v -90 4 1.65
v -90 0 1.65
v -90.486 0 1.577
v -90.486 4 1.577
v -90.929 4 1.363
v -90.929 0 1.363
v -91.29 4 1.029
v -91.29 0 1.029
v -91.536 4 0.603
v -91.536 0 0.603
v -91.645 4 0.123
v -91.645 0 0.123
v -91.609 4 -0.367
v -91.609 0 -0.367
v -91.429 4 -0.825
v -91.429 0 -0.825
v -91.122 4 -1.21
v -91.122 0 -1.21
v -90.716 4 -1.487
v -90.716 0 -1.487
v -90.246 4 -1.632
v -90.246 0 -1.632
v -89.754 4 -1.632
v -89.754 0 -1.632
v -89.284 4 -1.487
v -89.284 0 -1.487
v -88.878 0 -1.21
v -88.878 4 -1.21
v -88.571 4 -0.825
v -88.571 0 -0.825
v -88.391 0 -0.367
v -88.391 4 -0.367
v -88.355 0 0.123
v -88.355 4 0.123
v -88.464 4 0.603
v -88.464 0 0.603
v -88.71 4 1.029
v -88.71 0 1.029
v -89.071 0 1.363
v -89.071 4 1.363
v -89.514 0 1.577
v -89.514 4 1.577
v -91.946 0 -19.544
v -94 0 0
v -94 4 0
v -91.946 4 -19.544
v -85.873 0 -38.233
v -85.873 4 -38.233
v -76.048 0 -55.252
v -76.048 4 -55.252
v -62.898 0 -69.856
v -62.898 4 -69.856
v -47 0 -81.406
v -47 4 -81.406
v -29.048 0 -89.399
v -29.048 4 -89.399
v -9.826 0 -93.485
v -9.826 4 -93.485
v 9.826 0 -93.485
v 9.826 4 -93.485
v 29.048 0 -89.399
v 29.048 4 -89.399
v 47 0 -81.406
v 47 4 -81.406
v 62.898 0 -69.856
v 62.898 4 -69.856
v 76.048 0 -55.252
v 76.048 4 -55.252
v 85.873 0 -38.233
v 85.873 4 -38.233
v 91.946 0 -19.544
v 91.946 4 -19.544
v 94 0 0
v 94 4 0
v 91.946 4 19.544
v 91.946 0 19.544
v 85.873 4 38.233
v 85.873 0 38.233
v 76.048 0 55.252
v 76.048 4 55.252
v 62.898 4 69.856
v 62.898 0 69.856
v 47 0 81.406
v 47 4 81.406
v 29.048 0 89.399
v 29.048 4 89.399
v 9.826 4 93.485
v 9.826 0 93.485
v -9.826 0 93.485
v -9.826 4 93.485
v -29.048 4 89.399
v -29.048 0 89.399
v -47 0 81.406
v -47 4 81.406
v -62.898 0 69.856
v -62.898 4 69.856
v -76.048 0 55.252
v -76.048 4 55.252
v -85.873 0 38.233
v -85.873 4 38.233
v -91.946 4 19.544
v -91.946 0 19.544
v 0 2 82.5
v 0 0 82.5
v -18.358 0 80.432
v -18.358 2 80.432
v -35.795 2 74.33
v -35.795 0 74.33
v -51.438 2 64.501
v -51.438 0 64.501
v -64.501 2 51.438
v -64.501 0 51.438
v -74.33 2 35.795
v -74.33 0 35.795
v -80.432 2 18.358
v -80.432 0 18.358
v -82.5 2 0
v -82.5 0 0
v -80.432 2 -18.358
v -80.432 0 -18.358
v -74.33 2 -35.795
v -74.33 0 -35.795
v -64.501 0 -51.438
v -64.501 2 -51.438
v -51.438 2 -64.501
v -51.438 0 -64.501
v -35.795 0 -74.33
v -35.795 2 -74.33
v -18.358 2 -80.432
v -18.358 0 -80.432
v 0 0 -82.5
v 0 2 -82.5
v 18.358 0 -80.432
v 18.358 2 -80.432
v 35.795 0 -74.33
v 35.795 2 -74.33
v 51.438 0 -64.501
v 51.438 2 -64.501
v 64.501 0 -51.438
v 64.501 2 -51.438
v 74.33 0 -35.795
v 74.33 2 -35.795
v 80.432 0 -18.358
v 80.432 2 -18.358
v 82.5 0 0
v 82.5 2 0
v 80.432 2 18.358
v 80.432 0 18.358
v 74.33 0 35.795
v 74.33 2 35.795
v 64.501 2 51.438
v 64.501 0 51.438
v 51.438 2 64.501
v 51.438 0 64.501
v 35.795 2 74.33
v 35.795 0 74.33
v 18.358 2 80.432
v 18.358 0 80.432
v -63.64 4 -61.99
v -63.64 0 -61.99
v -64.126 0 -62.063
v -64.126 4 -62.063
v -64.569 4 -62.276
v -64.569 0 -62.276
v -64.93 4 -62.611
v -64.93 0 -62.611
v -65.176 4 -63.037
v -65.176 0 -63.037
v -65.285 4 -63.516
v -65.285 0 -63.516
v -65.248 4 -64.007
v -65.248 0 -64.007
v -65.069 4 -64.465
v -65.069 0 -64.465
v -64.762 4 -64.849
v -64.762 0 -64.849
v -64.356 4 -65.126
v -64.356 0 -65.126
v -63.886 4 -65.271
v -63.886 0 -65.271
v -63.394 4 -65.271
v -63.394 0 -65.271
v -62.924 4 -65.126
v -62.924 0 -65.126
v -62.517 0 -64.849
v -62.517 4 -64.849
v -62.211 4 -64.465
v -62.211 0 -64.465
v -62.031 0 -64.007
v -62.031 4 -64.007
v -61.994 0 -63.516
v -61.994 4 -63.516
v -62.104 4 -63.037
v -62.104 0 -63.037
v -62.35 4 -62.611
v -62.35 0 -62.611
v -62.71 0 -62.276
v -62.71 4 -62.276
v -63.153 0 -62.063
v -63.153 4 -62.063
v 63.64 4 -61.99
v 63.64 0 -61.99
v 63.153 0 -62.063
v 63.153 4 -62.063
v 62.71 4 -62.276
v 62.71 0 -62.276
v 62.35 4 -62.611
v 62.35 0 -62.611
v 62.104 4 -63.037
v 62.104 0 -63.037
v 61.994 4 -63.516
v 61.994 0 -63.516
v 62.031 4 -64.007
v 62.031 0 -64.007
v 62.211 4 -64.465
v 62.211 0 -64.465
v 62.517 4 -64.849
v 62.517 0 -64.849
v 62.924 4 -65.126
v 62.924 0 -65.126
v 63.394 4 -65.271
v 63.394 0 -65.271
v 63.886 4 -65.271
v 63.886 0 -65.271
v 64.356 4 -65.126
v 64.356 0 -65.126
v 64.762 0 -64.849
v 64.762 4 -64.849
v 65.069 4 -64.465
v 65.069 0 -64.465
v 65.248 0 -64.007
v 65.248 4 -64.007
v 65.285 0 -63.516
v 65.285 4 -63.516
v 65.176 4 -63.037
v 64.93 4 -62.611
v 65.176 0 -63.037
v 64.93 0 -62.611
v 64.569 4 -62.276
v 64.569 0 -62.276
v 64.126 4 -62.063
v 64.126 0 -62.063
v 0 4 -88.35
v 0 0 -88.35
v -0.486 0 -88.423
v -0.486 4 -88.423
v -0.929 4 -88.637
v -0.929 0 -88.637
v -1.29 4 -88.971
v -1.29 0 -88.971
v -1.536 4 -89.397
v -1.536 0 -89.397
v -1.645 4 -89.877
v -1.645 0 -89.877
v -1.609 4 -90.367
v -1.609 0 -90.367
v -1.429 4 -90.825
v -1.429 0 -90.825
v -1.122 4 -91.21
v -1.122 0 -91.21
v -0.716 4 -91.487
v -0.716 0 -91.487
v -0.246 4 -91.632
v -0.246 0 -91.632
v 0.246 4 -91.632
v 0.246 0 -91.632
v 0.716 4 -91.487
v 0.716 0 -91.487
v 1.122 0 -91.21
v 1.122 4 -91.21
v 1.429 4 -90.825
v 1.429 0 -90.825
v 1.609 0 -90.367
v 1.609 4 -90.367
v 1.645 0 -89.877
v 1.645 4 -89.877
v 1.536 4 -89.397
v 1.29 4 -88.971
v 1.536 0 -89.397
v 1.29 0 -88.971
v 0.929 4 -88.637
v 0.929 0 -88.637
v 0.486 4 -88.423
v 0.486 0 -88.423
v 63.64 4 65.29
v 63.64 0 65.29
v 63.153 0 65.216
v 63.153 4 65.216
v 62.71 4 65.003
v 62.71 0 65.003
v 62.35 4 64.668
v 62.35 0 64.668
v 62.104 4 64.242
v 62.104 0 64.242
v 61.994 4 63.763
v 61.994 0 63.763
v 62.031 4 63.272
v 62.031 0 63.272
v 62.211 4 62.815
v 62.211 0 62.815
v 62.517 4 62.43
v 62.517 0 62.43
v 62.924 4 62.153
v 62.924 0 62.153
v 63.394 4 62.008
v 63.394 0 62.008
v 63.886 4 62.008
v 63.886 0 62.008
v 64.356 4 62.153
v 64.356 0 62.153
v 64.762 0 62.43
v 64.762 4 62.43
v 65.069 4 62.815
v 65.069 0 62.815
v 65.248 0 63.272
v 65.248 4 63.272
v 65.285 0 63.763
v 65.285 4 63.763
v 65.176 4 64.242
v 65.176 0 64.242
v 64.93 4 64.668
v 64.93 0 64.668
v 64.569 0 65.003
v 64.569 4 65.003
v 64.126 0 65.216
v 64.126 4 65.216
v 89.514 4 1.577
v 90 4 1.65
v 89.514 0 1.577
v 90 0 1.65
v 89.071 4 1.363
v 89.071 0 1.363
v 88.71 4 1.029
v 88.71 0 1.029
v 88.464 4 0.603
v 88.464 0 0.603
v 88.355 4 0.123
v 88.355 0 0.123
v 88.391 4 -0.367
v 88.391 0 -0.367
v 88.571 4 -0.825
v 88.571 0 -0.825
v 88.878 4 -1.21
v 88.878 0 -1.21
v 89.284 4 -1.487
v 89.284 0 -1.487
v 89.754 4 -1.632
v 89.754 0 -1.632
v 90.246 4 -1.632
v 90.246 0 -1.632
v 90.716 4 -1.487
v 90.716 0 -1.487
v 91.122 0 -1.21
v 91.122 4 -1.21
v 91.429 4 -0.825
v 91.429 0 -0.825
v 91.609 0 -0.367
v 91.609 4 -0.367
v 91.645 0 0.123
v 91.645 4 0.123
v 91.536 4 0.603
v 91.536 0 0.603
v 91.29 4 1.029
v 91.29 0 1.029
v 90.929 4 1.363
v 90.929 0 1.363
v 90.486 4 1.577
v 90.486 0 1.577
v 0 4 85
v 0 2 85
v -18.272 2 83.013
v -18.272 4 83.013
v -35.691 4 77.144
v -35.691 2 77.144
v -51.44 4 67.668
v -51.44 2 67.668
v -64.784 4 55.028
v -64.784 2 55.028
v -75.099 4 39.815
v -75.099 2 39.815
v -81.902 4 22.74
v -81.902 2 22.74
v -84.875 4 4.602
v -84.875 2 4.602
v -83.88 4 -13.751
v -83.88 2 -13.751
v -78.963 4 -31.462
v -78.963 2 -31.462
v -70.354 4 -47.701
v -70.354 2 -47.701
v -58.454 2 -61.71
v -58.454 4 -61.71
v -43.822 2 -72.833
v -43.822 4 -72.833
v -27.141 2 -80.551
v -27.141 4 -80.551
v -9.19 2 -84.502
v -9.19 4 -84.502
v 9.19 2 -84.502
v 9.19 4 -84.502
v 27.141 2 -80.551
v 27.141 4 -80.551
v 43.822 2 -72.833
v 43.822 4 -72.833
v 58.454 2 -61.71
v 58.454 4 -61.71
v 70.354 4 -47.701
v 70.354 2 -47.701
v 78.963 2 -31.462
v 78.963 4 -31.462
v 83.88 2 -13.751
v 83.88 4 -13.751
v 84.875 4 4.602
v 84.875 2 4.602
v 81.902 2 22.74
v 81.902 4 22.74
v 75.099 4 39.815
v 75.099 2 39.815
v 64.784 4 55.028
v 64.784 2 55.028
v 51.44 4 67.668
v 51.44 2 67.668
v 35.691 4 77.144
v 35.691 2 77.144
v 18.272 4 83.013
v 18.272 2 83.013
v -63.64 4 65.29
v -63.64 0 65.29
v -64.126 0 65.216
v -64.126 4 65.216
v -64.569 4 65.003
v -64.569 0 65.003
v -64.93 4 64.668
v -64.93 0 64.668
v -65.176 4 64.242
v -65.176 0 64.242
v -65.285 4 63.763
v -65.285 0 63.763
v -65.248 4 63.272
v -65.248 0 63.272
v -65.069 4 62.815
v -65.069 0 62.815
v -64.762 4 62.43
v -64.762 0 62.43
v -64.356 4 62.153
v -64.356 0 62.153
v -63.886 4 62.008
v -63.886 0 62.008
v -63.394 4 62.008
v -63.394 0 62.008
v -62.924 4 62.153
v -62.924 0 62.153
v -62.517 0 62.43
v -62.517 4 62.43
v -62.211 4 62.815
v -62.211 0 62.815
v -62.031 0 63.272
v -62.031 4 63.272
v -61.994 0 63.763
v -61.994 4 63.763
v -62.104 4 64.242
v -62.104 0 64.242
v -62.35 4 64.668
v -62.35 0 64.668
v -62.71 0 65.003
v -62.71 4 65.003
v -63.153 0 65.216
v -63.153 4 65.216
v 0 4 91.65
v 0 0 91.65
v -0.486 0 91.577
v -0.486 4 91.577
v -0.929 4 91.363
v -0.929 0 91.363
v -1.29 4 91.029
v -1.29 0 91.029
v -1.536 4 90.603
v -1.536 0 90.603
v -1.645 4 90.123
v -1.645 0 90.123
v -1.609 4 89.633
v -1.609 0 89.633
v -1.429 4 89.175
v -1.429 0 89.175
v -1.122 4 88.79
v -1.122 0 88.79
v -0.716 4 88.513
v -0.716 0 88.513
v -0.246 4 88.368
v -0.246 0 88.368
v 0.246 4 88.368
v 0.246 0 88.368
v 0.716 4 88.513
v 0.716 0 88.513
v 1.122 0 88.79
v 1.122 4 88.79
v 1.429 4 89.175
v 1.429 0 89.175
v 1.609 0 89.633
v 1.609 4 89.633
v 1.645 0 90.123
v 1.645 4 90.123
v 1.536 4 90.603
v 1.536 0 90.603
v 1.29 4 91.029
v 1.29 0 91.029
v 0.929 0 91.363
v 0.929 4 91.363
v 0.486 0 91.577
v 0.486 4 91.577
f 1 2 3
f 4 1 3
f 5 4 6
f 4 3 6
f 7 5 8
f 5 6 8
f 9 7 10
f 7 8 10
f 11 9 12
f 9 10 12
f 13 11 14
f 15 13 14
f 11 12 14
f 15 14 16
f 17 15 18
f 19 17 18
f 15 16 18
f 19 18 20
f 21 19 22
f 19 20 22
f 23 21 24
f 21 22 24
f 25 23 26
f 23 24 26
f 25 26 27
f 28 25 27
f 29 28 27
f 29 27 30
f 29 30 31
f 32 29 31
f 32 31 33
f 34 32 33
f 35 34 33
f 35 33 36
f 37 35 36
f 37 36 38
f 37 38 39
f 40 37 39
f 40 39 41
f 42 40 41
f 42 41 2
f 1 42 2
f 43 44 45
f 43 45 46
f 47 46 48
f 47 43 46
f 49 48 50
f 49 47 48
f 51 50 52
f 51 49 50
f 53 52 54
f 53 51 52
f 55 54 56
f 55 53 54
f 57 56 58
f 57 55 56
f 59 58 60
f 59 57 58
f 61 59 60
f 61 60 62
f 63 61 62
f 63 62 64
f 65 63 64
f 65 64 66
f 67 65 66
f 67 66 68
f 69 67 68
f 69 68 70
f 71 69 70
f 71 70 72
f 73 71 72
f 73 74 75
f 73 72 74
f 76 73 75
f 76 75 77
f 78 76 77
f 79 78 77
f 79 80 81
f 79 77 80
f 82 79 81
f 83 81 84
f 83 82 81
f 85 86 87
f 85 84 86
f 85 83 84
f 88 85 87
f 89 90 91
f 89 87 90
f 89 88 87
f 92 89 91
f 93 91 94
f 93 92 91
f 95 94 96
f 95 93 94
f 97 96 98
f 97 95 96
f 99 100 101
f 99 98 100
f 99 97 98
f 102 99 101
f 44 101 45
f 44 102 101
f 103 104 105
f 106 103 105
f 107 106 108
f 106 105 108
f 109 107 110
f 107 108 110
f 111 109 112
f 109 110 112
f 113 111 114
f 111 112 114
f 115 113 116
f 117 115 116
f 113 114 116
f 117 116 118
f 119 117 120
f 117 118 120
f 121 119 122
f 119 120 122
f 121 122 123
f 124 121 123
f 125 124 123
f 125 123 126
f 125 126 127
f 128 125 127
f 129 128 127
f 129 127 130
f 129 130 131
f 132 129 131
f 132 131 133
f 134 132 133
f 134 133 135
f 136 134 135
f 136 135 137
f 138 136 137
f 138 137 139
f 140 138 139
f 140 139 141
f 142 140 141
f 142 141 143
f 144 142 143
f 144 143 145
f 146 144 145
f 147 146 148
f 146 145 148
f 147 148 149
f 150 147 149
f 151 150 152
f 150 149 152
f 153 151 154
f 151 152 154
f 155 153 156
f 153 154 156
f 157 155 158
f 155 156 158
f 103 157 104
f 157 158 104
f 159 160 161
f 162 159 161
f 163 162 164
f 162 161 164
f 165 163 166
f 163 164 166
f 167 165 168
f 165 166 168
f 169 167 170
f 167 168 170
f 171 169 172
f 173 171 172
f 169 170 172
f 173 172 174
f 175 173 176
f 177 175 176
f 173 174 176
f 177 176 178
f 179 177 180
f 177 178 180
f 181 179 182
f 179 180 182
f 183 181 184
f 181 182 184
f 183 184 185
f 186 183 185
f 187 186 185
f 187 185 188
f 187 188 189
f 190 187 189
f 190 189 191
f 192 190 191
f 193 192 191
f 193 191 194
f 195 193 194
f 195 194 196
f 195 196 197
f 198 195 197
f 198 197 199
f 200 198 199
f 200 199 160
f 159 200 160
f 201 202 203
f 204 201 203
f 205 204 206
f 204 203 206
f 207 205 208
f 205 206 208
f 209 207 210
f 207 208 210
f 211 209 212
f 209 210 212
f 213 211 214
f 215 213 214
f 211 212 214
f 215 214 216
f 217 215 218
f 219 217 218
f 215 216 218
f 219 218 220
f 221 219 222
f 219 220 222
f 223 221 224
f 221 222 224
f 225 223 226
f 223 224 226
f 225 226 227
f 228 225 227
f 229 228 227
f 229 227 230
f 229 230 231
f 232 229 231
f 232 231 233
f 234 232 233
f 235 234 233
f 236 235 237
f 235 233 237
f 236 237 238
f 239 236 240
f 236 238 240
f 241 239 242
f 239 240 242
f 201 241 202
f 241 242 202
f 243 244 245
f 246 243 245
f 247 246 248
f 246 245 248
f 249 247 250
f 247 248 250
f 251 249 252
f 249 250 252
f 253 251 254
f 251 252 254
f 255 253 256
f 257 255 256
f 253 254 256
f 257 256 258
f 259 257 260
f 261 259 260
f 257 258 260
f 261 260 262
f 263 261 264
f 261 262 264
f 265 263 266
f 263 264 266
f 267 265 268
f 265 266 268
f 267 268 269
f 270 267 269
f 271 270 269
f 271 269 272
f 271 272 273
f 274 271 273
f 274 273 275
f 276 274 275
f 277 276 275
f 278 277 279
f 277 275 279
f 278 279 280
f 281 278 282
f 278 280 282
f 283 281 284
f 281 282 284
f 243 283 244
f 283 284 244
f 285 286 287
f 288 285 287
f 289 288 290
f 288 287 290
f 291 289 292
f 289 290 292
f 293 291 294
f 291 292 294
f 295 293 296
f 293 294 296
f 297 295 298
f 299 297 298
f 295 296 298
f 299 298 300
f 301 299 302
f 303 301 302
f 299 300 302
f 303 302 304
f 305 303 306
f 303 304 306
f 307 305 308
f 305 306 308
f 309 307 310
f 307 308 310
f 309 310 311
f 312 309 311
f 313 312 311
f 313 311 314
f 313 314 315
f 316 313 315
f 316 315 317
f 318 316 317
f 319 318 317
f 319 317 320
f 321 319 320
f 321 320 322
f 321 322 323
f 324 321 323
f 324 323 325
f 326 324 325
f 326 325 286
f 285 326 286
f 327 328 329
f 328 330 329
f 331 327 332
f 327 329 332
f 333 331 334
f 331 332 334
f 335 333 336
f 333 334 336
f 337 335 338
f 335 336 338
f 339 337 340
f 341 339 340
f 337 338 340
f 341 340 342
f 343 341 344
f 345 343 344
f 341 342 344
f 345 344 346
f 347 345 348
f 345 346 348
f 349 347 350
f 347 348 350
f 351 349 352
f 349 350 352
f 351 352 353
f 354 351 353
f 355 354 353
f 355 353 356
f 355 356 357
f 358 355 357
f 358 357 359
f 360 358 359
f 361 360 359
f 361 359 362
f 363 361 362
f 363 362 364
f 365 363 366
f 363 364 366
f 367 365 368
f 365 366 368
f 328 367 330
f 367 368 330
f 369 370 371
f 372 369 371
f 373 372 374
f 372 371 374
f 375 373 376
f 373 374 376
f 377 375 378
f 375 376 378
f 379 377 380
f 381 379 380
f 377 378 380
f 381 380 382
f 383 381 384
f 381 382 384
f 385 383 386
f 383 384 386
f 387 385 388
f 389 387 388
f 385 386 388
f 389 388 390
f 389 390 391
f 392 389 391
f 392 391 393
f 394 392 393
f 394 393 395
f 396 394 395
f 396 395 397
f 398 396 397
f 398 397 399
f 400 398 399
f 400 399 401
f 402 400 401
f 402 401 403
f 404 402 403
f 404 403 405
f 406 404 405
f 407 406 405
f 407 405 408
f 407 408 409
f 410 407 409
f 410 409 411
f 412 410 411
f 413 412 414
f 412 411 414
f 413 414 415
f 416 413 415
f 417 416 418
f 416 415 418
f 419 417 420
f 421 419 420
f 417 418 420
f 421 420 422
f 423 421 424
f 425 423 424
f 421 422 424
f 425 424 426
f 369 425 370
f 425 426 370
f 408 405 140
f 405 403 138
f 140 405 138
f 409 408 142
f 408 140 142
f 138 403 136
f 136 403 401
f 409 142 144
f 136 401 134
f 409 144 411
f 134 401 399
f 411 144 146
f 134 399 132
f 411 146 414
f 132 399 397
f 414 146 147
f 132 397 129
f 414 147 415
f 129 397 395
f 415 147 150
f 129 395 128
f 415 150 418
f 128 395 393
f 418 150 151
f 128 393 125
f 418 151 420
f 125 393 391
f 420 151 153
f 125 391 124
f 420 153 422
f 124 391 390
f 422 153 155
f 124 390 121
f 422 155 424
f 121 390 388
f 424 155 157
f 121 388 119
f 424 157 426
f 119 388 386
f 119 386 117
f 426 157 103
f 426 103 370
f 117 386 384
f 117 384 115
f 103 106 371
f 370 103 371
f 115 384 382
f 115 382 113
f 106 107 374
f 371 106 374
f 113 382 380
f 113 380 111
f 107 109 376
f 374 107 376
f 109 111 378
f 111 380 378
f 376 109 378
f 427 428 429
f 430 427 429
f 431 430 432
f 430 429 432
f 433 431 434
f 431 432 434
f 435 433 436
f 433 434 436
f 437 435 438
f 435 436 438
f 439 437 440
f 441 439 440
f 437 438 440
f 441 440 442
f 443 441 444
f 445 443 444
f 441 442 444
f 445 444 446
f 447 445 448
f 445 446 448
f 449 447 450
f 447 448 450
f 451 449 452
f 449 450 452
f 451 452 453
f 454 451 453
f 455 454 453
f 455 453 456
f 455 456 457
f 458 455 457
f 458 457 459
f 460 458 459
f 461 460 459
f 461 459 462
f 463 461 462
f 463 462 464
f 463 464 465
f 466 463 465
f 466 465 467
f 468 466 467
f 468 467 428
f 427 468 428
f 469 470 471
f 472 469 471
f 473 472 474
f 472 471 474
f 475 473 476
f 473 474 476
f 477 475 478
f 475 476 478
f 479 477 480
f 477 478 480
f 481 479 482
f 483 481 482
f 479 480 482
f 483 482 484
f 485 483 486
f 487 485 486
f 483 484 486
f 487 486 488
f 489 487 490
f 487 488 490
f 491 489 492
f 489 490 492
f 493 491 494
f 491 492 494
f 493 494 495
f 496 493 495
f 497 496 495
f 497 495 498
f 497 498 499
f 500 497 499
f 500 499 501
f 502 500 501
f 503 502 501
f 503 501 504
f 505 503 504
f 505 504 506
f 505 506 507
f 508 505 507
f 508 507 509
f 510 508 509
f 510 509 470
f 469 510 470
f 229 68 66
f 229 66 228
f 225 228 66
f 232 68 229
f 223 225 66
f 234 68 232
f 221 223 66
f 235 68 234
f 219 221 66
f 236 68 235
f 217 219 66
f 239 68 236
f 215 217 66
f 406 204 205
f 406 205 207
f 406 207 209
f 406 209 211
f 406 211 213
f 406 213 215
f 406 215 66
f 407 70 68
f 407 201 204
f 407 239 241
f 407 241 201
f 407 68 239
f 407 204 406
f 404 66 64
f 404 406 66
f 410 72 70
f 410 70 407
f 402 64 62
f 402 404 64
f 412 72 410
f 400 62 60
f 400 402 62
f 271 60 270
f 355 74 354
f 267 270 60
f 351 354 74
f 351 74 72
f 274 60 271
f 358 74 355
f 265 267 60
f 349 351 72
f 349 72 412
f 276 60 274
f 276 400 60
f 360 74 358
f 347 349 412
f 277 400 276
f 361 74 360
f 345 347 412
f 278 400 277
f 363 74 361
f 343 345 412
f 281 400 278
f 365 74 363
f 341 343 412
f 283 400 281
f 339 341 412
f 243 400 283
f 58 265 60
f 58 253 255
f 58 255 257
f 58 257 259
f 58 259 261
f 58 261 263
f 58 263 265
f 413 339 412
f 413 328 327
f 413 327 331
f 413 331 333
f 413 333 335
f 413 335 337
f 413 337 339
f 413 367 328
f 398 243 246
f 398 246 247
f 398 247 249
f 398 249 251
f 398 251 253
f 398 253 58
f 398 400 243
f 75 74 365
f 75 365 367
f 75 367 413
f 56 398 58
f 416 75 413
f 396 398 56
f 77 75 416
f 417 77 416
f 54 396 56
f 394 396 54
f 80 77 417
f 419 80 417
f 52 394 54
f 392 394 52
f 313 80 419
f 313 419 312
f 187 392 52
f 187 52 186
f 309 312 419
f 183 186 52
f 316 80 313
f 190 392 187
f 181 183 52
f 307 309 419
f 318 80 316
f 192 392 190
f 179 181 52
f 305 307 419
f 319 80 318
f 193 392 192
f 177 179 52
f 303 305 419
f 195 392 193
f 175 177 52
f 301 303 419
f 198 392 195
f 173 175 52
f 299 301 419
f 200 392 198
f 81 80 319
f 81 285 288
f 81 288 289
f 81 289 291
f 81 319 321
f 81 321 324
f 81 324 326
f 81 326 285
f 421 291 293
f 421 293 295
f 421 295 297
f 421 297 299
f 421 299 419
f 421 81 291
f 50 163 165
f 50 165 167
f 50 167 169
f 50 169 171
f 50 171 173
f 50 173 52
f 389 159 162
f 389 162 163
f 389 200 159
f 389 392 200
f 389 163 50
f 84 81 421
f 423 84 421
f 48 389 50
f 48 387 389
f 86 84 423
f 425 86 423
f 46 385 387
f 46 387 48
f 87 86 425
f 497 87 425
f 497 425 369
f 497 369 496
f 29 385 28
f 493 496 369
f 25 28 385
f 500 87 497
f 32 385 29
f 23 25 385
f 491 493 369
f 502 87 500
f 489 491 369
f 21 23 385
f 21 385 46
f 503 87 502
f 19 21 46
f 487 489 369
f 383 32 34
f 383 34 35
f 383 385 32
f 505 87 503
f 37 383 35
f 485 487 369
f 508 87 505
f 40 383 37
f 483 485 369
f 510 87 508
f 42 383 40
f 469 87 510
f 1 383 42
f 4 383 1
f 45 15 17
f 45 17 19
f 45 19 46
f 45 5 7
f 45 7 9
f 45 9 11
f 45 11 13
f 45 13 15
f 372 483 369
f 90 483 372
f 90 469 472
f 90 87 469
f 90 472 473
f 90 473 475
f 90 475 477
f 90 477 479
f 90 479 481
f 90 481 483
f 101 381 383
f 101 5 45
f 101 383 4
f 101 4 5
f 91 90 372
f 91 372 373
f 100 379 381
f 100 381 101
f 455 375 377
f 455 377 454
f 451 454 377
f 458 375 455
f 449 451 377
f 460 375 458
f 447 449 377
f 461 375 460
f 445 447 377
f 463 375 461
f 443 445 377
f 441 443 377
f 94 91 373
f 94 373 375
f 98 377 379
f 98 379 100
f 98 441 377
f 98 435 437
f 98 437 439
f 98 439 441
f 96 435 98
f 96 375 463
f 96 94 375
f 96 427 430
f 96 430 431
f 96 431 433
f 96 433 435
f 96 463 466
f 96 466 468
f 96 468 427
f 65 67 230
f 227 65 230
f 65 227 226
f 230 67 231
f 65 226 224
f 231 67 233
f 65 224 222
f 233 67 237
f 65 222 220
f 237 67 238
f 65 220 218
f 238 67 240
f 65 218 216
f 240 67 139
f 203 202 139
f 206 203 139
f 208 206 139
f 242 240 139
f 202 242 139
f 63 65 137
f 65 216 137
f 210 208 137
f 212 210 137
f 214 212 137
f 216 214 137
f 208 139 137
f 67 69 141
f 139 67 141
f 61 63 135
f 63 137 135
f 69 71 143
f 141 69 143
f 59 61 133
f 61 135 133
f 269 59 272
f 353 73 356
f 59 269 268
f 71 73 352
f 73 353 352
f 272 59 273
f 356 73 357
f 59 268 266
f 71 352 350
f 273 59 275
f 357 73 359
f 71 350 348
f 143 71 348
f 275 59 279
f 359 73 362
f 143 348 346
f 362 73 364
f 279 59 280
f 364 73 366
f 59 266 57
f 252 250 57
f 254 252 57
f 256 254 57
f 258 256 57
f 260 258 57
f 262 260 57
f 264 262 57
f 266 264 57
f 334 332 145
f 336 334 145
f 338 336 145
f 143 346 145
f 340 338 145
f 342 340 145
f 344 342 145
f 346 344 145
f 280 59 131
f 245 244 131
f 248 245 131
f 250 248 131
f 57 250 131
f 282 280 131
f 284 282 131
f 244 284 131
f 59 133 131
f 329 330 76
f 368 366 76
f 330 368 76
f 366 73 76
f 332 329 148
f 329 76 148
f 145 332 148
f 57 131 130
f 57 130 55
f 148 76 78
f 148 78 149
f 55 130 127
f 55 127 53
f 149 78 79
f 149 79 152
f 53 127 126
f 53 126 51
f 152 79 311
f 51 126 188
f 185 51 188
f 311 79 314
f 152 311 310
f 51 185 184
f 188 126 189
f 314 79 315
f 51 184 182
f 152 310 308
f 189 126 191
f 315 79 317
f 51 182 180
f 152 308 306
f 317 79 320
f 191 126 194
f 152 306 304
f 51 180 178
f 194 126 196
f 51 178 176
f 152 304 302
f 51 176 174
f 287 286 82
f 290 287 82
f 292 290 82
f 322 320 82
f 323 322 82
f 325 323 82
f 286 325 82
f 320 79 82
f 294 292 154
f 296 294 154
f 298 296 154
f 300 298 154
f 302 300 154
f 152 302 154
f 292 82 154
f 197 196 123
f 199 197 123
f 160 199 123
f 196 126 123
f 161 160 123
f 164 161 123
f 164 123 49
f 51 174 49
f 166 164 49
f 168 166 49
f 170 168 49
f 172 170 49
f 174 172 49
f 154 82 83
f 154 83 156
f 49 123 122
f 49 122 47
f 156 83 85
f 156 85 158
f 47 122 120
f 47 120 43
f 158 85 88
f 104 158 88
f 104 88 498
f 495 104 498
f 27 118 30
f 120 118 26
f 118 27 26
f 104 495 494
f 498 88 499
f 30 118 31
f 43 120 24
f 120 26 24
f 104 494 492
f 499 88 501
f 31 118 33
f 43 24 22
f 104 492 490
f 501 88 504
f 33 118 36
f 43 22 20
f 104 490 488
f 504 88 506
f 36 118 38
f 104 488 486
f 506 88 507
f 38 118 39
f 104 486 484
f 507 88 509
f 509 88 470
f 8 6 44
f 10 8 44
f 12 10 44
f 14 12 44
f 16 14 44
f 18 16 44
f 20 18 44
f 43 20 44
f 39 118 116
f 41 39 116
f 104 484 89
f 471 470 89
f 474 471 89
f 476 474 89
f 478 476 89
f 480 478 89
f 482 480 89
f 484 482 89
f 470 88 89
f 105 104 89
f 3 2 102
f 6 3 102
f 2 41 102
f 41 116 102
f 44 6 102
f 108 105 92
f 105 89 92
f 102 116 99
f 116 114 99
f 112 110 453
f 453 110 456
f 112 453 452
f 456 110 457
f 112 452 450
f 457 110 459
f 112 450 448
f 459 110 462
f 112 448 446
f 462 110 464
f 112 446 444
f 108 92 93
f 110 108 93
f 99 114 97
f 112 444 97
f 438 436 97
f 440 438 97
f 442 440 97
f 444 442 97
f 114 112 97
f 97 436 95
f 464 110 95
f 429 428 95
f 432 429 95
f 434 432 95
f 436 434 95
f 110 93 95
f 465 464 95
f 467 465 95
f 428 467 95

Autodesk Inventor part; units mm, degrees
ref_plane "YZ Plane" through (0, 0, 0) normal (1, 0, 0) x (0, 1, 0)
ref_plane "XZ Plane" through (0, 0, 0) normal (0, 1, 0) x (-1, 0, 0)
ref_plane "XY Plane" through (0, 0, 0) normal (0, 0, 1) x (1, 0, 0)
sketch "Sketch1" plane through (0, 0, 0) normal (0, 1, 0) x (-1, 0, 0)
  circle A0 centre (0, 0) radius 94
  dimension "d0" = 188
extrude "Extrusion1" add sketch "Sketch1" along normal blind 4
sketch "Sketch2" plane through (0, 4, 0) normal (0, 1, 0) x (1, 0, 0)
  circle A0 centre (0, 0) radius 87.5
  dimension "d3" = 175
hole "Hole1" at (0, 4, 0) direction (0, -1, 0) diameter 170 depth 2
sketch "Sketch3" plane through (0, 2, 0) normal (0, 1, 0) x (1, 0, 0)
  circle A0 centre (0, 0) radius 82
  dimension "d11" = 164
hole "Hole2" at (0, 2, 0) direction (0, -1, 0) diameter 165 end through all
sketch "Sketch4" plane through (0, 4, 0) normal (0, 1, 0) x (1, 0, 0)
  circle A0 centre (-90, 0) radius 1.65
  point P0 (0, 0)
  dimension "d19" = 3.3
  dimension "d20" = 90
sketch "Sketch5" plane through (0, 4, 0) normal (0, 1, 0) x (1, 0, 0)
  circle A0 centre (-63.6396, 63.6396) radius 1.65
  point P0 (0, 0)
  dimension "d28" = 3.3
  dimension "d29" = 90
  dimension "d33" = 63.6396
sketch "Sketch6" plane through (0, 4, 0) normal (0, 1, 0) x (1, 0, 0)
  circle A0 centre (0, 90) radius 1.65
  point P0 (0, 0)
  dimension "d34" = 3.3
  dimension "d35" = 90
sketch "Sketch7" plane through (0, 4, 0) normal (0, 1, 0) x (1, 0, 0)
  circle A0 centre (63.6396, 63.6396) radius 1.65
  point P0 (0, 0)
  dimension "d36" = 3.3
  dimension "d37" = 90
  dimension "d38" = 63.6396
  dimension "d121" = 63.6396
sketch "Sketch8" plane through (0, 4, 0) normal (0, 1, 0) x (1, 0, 0)
  circle A0 centre (90, 0) radius 1.65
  point P0 (0, 0)
  dimension "d39" = 3.3
  dimension "d40" = 90
sketch "Sketch9" plane through (0, 4, 0) normal (0, 1, 0) x (1, 0, 0)
  circle A0 centre (63.6396, -63.6396) radius 2.15
  point P0 (0, 0)
  dimension "d41" = 4.3
  dimension "d42" = 90
  dimension "d43" = 63.6396
  dimension "d122" = 63.6396
sketch "Sketch10" plane through (0, 4, 0) normal (0, 1, 0) x (1, 0, 0)
  circle A0 centre (0, -90) radius 1.65
  point P0 (0, 0)
  dimension "d44" = 3.3
  dimension "d45" = 90
sketch "Sketch11" plane through (0, 4, 0) normal (0, 1, 0) x (1, 0, 0)
  circle A0 centre (-63.6396, -63.6396) radius 1.65
  point P0 (0, 0)
  dimension "d46" = 3.3
  dimension "d47" = 90
  dimension "d48" = 63.6396
  dimension "d123" = 63.6396
hole "Hole4" at (-90, 4, 0) direction (0, -1, 0) diameter 3.3 end through all
hole "Hole5" at (-63.6396, 4, -63.6396) direction (0, -1, 0) diameter 3.3 end through all
hole "Hole6" at (0, 4, -90) direction (0, -1, 0) diameter 3.3 end through all
hole "Hole7" at (63.6396, 4, -63.6396) direction (0, -1, 0) diameter 3.3 end through all
hole "Hole8" at (90, 4, 0) direction (0, -1, 0) diameter 3.3 end through all
hole "Hole9" at (63.6396, 4, 63.6396) direction (0, -1, 0) diameter 3.3 end through all
hole "Hole10" at (0, 4, 90) direction (0, -1, 0) diameter 3.3 end through all
hole "Hole11" at (-63.6396, 4, 63.6396) direction (0, -1, 0) diameter 3.3 end through all
thread "Thread9" size "M3.5x0.6" class "6H" standard "ANSI Metric M Profile" full length
thread "Thread10" size "M3.5x0.6" class "6H" standard "ANSI Metric M Profile" full length
thread "Thread11" size "M3.5x0.6" class "6H" standard "ANSI Metric M Profile" full length
thread "Thread12" size "M3.5x0.6" class "6H" standard "ANSI Metric M Profile" full length
thread "Thread13" size "M3.5x0.6" class "6H" standard "ANSI Metric M Profile" full length
thread "Thread14" size "M3.5x0.6" class "6H" standard "ANSI Metric M Profile" full length
thread "Thread15" size "M3.5x0.6" class "6H" standard "ANSI Metric M Profile" full length
thread "Thread16" size "M3.5x0.6" class "6H" standard "ANSI Metric M Profile" full length
thread "Thread17" size "M3.5x0.6" class "6H" standard "ANSI Metric M Profile" full length
properties part number "Shield Support Ring"
